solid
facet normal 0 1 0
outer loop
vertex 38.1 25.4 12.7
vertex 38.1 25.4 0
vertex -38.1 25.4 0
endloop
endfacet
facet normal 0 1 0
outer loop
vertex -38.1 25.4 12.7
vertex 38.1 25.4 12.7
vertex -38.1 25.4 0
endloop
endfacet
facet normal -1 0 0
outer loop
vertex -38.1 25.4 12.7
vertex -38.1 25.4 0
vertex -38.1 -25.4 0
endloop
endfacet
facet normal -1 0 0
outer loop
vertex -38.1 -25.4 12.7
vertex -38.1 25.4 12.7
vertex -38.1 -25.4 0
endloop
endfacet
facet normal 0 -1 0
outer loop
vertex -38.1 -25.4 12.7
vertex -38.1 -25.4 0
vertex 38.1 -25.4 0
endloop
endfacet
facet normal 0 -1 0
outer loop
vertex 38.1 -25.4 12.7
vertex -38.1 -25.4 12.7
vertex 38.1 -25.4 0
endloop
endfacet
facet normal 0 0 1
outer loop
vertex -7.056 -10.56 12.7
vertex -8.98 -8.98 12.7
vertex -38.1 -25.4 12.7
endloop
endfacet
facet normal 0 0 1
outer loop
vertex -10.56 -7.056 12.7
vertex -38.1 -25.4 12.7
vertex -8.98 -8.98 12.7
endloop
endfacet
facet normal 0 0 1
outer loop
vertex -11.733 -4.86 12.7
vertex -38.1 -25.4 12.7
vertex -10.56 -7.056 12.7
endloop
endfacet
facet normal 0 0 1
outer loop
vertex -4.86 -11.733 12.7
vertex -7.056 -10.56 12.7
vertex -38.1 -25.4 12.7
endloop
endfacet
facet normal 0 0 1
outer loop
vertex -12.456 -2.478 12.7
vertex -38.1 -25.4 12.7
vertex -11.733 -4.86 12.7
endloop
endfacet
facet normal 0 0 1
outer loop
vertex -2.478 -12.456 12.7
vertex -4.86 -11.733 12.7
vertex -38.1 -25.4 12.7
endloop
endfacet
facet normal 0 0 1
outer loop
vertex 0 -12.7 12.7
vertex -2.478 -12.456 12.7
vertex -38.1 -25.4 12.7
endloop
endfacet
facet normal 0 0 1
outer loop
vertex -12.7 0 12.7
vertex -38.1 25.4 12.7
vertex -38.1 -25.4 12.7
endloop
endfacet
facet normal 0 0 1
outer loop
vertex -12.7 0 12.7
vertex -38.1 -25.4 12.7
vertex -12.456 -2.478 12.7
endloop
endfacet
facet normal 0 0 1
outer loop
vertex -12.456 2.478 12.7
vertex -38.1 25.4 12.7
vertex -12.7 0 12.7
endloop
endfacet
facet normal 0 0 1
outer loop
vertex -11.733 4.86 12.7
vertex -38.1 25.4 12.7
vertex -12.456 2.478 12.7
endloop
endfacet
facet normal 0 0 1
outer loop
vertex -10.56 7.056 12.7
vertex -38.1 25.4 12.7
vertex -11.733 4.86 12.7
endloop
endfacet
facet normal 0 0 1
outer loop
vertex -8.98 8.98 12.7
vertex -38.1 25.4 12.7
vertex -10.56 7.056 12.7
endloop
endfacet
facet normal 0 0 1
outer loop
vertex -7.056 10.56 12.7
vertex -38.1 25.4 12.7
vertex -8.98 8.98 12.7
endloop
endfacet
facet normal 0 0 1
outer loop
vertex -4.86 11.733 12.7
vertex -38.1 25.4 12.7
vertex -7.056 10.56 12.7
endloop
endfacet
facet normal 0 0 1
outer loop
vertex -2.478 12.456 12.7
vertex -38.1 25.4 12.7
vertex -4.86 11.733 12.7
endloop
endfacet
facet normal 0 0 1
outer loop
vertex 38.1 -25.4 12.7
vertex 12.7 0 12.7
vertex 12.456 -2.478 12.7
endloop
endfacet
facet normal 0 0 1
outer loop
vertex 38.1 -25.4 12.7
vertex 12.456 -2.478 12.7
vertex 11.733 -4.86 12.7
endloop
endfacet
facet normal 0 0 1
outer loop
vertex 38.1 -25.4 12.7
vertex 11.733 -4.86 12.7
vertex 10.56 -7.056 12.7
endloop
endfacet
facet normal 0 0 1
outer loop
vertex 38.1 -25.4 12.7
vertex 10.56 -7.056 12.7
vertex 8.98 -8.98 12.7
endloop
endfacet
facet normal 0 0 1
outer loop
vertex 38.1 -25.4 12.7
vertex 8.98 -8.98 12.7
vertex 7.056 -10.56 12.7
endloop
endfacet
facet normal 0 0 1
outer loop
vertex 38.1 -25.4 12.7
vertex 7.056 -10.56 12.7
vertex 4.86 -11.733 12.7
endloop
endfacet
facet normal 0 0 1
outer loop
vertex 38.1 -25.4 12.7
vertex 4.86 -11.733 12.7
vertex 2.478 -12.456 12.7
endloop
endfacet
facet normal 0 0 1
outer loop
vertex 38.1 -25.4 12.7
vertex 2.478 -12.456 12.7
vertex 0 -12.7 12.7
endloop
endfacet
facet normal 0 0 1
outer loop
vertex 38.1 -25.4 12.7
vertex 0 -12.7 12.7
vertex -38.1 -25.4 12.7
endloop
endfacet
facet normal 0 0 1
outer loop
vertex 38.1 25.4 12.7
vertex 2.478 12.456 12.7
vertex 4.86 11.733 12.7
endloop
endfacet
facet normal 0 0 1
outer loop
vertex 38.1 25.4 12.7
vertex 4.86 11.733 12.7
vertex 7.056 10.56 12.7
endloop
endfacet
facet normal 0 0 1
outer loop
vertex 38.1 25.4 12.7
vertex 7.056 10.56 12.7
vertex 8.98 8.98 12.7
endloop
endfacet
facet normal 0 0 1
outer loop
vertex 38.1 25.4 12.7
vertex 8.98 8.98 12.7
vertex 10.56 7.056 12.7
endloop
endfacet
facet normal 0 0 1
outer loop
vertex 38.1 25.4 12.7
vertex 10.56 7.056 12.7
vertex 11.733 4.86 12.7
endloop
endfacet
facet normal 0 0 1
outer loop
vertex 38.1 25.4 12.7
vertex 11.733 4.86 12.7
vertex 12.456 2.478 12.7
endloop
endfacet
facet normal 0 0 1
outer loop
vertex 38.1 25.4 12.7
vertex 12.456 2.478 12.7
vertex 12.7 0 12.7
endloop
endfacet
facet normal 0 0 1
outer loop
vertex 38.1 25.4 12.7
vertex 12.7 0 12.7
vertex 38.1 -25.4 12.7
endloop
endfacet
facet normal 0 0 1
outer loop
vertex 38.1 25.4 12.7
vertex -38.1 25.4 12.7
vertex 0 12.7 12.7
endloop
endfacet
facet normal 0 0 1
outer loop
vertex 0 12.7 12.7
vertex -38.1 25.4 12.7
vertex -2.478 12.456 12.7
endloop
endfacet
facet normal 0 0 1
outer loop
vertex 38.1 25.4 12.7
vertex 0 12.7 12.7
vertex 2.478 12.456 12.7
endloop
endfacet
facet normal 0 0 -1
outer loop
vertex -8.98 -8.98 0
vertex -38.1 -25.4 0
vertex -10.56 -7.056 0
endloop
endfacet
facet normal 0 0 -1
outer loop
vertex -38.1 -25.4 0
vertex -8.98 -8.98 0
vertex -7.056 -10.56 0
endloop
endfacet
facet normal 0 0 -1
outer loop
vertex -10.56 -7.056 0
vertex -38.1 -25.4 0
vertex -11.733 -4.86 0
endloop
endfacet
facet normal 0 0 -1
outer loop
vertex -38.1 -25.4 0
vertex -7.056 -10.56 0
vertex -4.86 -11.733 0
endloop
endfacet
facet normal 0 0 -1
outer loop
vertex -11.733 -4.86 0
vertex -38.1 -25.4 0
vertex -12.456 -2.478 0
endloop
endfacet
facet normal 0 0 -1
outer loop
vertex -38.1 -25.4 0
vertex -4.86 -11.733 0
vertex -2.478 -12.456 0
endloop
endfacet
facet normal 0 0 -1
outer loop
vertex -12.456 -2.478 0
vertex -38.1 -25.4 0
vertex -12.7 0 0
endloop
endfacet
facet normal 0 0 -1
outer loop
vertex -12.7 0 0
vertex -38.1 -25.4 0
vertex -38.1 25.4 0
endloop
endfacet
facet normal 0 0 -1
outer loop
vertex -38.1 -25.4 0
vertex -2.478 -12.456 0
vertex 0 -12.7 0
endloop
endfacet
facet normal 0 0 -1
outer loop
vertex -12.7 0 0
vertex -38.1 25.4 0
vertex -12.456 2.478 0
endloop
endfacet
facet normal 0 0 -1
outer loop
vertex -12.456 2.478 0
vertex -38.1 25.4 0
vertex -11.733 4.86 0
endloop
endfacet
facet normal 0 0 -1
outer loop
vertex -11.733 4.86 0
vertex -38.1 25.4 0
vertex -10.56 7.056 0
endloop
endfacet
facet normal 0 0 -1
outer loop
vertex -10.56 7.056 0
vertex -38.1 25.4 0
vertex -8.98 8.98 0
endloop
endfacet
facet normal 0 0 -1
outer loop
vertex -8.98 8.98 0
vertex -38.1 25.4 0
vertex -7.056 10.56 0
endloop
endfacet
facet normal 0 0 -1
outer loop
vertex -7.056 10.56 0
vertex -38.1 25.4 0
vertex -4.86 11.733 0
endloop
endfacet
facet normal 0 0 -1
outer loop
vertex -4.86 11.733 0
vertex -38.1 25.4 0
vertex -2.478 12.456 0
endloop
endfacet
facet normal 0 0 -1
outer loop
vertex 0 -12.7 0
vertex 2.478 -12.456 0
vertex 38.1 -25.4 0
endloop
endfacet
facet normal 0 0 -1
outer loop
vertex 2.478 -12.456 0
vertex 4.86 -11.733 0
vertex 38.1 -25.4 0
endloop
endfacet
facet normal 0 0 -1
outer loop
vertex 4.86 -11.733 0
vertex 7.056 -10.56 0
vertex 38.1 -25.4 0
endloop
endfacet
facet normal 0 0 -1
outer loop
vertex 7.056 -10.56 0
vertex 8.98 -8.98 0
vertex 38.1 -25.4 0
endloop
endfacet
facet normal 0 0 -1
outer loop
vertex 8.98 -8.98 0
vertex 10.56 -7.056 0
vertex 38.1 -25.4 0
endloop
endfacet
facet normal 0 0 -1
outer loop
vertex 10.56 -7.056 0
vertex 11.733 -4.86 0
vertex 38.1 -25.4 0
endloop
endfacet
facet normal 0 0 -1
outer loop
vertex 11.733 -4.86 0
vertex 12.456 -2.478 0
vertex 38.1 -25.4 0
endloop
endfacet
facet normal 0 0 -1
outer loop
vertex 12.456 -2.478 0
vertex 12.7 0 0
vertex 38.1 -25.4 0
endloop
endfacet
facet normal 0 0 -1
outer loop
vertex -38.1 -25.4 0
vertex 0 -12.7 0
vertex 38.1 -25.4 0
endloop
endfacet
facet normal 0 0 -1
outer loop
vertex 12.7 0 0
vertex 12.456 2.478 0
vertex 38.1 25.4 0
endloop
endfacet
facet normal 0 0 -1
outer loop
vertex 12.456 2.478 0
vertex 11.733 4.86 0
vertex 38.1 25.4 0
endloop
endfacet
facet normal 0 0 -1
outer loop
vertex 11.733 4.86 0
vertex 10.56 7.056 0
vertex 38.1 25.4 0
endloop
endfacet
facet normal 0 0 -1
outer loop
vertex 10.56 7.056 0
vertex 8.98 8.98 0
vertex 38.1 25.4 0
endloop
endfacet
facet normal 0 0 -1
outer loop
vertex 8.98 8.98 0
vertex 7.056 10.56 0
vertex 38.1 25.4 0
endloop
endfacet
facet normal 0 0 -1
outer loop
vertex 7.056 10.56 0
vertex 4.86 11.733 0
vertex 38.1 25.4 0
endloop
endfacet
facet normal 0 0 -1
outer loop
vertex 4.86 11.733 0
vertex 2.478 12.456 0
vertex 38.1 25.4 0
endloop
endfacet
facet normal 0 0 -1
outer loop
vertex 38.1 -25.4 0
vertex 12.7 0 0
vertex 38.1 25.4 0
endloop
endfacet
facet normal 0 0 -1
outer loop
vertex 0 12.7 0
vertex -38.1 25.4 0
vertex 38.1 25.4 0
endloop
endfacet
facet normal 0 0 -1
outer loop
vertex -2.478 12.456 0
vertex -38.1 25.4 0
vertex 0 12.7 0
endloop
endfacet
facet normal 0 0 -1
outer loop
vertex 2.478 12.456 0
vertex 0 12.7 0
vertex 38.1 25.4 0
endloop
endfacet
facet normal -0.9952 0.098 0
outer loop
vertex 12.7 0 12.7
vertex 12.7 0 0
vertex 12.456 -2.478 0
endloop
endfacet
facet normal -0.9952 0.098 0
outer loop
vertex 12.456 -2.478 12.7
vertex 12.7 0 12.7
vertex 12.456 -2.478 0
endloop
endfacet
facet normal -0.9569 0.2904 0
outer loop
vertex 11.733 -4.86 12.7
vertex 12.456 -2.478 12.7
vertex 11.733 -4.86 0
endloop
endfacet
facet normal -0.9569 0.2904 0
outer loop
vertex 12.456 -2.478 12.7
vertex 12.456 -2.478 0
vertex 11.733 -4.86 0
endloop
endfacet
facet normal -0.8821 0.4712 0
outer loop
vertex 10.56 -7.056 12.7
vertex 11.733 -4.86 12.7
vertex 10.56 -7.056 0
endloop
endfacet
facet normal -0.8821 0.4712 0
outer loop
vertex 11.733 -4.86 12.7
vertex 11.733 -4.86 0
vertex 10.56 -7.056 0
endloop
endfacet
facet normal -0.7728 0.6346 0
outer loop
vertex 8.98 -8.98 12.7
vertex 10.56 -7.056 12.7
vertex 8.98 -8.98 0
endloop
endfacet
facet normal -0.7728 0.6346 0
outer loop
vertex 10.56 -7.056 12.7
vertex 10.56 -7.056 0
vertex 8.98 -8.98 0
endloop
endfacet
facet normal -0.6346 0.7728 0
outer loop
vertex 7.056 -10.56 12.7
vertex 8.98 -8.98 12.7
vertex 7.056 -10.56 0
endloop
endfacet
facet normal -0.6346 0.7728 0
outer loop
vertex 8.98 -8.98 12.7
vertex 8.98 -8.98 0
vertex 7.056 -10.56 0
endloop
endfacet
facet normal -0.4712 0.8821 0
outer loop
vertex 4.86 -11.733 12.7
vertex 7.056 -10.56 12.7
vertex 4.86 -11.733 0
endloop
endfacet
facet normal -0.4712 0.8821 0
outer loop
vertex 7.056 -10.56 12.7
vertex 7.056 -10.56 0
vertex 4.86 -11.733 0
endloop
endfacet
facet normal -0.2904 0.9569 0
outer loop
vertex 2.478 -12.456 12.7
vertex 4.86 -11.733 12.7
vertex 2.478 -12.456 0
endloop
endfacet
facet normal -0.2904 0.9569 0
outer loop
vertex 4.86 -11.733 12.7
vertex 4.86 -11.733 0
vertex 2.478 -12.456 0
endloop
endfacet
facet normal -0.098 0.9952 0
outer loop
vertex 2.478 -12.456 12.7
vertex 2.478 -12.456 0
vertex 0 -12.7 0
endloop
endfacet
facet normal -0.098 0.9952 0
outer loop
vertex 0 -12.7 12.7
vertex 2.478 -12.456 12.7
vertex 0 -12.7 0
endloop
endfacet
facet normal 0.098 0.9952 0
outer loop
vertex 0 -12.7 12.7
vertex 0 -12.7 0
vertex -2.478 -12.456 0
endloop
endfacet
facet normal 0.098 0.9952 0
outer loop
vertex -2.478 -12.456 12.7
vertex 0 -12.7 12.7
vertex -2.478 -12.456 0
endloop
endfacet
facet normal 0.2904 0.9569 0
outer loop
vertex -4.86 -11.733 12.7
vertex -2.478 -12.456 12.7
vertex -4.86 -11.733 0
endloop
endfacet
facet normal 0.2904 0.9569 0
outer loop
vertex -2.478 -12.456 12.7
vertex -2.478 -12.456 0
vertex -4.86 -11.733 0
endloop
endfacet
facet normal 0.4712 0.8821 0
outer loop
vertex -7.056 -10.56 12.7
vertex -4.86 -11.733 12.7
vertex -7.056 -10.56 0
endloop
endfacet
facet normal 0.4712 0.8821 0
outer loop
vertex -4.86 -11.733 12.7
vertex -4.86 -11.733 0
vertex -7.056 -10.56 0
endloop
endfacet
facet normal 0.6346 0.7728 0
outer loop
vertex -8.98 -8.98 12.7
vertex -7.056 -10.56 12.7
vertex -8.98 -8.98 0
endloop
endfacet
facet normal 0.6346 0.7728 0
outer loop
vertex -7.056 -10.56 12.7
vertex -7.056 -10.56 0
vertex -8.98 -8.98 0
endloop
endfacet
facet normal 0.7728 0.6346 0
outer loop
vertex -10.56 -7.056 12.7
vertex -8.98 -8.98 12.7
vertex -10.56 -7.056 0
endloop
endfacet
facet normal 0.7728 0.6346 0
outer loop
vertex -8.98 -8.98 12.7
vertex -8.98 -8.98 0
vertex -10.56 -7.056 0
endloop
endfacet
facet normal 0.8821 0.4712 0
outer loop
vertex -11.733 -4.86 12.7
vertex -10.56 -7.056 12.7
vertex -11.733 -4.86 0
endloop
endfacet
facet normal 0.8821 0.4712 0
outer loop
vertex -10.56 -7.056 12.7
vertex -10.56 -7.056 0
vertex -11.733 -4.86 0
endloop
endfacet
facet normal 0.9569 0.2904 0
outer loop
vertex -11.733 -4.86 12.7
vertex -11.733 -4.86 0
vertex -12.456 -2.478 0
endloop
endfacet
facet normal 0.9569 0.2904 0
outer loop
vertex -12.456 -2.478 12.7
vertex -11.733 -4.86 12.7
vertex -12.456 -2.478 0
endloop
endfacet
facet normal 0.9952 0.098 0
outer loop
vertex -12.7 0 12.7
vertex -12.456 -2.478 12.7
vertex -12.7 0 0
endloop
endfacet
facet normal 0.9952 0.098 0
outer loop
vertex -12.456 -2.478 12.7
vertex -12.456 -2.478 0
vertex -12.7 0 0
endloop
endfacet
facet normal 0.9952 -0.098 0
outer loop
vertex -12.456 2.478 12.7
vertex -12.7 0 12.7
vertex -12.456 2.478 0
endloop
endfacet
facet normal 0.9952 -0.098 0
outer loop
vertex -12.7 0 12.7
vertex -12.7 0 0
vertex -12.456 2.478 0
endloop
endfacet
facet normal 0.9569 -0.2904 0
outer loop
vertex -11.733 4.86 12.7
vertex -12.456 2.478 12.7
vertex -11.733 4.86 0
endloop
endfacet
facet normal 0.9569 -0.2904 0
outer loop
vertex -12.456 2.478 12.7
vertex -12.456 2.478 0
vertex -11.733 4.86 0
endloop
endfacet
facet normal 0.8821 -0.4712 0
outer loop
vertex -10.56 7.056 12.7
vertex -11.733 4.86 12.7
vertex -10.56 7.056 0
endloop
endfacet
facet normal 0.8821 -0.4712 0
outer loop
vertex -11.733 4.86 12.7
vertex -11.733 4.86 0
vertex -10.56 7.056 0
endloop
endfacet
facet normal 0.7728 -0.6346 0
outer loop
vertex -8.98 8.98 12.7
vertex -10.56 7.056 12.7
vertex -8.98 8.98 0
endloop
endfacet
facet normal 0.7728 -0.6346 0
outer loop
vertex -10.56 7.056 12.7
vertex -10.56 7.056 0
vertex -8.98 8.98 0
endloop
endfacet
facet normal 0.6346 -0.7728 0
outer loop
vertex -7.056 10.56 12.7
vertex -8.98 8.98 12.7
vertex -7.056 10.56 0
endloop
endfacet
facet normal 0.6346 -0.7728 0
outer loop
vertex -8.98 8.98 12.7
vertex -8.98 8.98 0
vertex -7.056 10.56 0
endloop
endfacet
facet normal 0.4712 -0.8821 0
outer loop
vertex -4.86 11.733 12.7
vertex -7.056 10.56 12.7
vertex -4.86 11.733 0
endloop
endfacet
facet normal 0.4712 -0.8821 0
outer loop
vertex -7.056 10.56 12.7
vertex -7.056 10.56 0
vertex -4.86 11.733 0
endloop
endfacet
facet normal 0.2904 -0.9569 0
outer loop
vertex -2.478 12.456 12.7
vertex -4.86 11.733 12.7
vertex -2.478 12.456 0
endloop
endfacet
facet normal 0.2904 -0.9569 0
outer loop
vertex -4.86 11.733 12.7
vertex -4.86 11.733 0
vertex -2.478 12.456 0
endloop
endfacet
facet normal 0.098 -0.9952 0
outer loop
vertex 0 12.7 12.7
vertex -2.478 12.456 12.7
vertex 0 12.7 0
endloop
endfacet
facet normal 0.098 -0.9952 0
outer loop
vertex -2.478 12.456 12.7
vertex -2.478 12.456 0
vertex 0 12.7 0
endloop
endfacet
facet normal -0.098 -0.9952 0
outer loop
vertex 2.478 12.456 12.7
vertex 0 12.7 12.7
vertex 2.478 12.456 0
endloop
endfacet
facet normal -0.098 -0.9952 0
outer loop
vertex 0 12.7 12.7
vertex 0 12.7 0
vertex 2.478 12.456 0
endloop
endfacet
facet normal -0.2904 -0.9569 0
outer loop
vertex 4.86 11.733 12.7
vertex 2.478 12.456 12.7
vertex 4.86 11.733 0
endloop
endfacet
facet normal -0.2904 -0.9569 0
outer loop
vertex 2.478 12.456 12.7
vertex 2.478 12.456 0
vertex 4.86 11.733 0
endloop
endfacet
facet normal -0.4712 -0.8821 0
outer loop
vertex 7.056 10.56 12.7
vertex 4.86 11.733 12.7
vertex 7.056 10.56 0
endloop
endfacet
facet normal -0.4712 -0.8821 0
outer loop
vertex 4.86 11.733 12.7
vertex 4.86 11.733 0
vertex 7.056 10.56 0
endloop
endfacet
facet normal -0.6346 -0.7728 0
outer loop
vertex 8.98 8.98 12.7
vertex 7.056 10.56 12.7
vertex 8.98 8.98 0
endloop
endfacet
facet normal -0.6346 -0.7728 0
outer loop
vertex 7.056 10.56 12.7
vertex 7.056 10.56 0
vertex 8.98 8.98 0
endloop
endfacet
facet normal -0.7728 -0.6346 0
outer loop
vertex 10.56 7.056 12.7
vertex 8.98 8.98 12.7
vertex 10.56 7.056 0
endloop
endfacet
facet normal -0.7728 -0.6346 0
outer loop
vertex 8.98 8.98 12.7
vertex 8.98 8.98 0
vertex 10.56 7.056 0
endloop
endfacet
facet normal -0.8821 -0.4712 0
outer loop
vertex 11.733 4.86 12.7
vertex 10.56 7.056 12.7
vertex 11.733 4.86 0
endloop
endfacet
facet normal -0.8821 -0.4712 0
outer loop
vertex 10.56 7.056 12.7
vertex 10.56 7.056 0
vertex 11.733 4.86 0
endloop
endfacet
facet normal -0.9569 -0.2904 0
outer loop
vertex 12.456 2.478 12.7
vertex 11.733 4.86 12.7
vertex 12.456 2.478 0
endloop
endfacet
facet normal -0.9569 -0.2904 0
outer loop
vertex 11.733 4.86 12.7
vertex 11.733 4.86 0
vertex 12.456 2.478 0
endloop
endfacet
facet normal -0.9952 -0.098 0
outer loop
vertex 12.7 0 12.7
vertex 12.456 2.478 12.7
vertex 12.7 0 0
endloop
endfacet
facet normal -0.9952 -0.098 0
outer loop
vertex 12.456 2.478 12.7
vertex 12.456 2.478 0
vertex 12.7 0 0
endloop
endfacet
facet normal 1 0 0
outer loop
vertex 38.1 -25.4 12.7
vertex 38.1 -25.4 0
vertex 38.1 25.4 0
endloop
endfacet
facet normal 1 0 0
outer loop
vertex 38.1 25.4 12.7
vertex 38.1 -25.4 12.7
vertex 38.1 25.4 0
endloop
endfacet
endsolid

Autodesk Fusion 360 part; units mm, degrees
sketch "RectangleWithCircle" plane through (0, 0, 0) normal (0, 0, 1) x (1, 0, 0)
  line L0 (-38.1, -25.4) -> (38.1, -25.4)
  line L1 (38.1, -25.4) -> (38.1, 25.4)
  line L2 (38.1, 25.4) -> (-38.1, 25.4)
  line L3 (-38.1, 25.4) -> (-38.1, -25.4)
  circle A0 centre (0, 0) radius 12.7
  dimension "d1" = 76.2
  dimension "d2" = 50.8
  dimension "d3" = 25.4
sketch "Sketch2" plane through (0, 0, 0) normal (0, 0, 1) x (1, 0, 0)
  line L0 (-38.1, -25.4) -> (38.1, -25.4)
  line L1 (38.1, -25.4) -> (38.1, 25.4)
  line L2 (38.1, 25.4) -> (-38.1, 25.4)
  line L3 (-38.1, 25.4) -> (-38.1, -25.4)
  dimension "d6" = 50.8
  dimension "d7" = 76.2
extrude "Extrude1" add sketch "Sketch2" along normal blind 12.7
extrude "Extrude2" cut sketch "RectangleWithCircle" along normal through all contours A0
equation "d3 = ( 1.27 cm ) * 2"
